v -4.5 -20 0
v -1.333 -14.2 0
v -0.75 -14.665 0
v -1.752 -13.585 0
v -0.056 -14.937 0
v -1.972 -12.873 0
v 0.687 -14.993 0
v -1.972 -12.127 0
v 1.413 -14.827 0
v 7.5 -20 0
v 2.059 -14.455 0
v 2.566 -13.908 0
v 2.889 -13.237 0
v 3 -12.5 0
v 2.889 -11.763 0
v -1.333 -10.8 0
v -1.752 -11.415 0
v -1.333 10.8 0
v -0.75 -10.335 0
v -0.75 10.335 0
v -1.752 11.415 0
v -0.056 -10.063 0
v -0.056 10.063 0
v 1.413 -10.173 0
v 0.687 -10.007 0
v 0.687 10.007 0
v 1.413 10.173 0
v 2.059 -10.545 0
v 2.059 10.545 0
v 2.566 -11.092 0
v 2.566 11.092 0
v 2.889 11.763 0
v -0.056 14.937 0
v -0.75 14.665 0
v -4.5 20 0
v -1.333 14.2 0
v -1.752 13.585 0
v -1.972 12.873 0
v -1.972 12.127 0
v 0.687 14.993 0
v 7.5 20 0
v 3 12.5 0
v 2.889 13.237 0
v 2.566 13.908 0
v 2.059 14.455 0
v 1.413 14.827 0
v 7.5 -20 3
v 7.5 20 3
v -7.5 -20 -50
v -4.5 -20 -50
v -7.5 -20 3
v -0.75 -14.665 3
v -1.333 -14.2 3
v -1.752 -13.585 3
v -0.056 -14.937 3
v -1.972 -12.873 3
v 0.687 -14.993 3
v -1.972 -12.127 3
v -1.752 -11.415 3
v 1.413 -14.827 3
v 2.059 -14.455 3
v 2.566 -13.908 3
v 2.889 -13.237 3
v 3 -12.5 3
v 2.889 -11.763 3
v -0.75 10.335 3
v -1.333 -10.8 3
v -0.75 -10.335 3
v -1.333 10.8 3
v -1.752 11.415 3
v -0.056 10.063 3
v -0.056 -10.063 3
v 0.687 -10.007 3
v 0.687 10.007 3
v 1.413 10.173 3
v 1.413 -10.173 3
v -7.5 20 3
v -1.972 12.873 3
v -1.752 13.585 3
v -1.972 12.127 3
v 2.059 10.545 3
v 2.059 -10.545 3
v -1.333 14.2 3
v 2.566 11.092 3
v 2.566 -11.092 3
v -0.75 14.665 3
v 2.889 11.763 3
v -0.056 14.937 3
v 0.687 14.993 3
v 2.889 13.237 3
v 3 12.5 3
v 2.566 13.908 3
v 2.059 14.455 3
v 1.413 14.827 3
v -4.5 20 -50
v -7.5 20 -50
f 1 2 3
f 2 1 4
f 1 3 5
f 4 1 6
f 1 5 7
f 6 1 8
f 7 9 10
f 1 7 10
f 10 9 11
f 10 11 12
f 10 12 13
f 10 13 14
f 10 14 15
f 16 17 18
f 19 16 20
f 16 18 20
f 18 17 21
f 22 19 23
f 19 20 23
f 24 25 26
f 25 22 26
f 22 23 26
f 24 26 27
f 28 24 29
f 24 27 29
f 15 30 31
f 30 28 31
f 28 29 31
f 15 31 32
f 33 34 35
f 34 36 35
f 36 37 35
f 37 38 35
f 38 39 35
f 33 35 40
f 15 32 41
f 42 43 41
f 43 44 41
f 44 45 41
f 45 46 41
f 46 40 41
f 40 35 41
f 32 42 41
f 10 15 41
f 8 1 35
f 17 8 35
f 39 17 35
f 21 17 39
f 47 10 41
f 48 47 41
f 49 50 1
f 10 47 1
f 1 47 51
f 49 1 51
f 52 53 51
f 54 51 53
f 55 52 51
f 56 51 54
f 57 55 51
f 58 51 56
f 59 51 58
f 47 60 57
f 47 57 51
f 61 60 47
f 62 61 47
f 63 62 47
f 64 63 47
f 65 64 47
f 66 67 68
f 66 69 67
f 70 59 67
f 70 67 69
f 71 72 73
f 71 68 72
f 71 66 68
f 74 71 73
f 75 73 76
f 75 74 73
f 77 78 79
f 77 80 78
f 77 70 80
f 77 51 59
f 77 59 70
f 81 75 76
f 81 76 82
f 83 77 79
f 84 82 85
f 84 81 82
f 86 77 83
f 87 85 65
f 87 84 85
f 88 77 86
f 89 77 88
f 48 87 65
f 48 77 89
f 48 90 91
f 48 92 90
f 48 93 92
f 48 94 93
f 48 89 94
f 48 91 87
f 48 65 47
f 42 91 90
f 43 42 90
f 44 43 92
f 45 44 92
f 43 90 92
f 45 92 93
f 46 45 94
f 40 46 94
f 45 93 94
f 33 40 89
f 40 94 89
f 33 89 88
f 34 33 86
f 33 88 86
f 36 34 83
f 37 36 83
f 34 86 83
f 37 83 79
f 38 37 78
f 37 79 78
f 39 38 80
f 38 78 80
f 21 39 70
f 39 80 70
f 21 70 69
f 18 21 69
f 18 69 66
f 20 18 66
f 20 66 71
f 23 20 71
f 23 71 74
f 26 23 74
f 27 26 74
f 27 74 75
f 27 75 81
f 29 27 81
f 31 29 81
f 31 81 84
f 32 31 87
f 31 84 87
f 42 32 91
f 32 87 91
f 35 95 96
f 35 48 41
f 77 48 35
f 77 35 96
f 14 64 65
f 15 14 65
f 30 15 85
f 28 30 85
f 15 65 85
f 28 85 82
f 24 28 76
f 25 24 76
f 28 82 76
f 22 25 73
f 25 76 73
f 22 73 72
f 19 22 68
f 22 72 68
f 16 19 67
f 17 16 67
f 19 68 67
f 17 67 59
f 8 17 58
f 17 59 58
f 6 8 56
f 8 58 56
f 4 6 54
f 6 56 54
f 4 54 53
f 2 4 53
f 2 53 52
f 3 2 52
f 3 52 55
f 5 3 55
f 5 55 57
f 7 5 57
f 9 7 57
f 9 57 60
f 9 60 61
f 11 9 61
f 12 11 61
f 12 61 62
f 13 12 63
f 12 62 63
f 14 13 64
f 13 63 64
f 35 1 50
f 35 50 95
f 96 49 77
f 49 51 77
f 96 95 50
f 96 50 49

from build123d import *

# Parameters (mm, degrees)
SKETCH1_W           = 15
SKETCH1_H           = 40
BOSS_EXTRUDE1_DEPTH = 3
SKETCH2_W           = 3
SKETCH2_H           = 40
BOSS_EXTRUDE2_DEPTH = 50
SKETCH3_R           = 2.5
CUT_EXTRUDE1_DEPTH  = 3
LPATTERN1_COUNT     = 2
LPATTERN1_PITCH     = 25


with BuildPart() as part:
    # Sketch1 → Boss-Extrude1 (new body)
    with BuildSketch(Plane.XY):
        Rectangle(SKETCH1_W, SKETCH1_H)
    extrude(amount=BOSS_EXTRUDE1_DEPTH)

    # Sketch2 → Boss-Extrude2 (add)
    with BuildSketch(Plane(origin=(0, 0, 0), x_dir=(-1, 0, 0), z_dir=(0, 0, -1))):
        with Locations((6, 0)):
            Rectangle(SKETCH2_W, SKETCH2_H)
    extrude(amount=BOSS_EXTRUDE2_DEPTH)

    # Sketch3 → Cut-Extrude1 (cut)
    with BuildSketch(Plane.XY.offset(3)):
        with Locations((0.5, 12.5)):
            Circle(SKETCH3_R)
    cut_extrude1 = extrude(amount=-CUT_EXTRUDE1_DEPTH, mode=Mode.SUBTRACT)

    # LPattern1: Cut-Extrude1 ×2
    with Locations(*[(0, -i * LPATTERN1_PITCH, 0) for i in range(1, LPATTERN1_COUNT)]):
        add(cut_extrude1, mode=Mode.SUBTRACT)


solid = part.part
